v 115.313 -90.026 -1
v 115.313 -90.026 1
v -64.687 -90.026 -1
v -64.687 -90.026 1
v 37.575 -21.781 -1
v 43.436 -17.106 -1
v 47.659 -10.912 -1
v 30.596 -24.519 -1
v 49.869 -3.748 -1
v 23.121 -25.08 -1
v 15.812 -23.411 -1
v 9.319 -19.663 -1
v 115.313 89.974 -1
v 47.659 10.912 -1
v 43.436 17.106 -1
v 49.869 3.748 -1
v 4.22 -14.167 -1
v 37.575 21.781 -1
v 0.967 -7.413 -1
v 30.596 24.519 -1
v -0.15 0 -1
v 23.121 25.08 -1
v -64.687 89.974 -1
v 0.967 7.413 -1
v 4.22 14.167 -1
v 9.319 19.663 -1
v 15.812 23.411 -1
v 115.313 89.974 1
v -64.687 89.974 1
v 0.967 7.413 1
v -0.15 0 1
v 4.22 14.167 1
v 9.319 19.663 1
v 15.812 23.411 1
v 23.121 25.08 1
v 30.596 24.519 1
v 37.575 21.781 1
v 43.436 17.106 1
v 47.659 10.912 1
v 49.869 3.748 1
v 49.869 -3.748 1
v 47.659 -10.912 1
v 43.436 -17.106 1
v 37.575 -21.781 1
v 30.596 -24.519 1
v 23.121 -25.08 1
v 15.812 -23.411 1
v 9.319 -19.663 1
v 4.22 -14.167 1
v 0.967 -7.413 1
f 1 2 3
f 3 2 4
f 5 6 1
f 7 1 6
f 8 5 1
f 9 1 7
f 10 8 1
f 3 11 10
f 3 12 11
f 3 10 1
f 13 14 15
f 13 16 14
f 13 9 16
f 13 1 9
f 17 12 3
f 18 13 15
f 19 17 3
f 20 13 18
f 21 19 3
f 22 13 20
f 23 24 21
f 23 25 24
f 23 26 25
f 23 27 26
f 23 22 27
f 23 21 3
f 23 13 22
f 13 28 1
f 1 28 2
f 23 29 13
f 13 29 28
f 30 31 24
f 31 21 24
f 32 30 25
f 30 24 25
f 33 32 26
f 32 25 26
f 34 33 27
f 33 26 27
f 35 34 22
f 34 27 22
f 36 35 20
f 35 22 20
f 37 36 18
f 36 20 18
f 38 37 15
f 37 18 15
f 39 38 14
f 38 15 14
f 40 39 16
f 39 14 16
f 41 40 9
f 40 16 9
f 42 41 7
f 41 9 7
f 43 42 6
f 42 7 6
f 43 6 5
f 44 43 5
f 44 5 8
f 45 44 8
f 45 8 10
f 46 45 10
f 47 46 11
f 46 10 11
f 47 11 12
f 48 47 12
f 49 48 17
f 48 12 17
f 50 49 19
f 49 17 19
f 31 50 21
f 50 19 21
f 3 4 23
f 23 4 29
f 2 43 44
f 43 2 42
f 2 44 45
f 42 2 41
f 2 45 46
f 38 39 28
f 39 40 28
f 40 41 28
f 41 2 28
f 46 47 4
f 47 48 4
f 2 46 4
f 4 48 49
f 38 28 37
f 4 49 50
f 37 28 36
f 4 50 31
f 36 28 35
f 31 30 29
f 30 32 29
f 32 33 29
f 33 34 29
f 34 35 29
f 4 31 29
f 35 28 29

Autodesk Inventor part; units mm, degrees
ref_plane "YZ Plane" through (0, 0, 0) normal (1, 0, 0) x (0, 1, 0)
ref_plane "XZ Plane" through (0, 0, 0) normal (0, 1, 0) x (-1, 0, 0)
ref_plane "XY Plane" through (0, 0, 0) normal (0, 0, 1) x (1, 0, 0)
ref_plane "Work Plane1" through (0, 0, 0) normal (0, 0, -1) x (-1, 0, 0)
sketch "Sketch1" plane through (0, 0, 0) normal (0, 0, -1) x (-1, 0, 0)
  line L0 (-115.3126, -90.0255) -> (64.6874, -90.0255)
  line L1 (64.6874, -90.0255) -> (64.6874, 89.9745)
  line L2 (64.6874, 89.9745) -> (-115.3126, 89.9745)
  line L3 (-115.3126, 89.9745) -> (-115.3126, -90.0255)
  line L4 (-25.3126, 0) -> (-25.3126, -88.1346) construction
  line L5 (-1.4905, -0.0255) -> (99.3864, -0.0255) construction
  point P0 (0, 0)
  point P1 (-25.3126, -0.0255)
  dimension "d0" = 180
  dimension "d1" = 180
  dimension "d8" = 90
  dimension "d9" = 90
extrude "Extrusion1" add sketch "Sketch1" along normal mid plane 2
sketch "Sketch2" plane through (0, 0, -1) normal (0, 0, -1) x (-1, 0, 0)
  circle A0 centre (-25, 0) radius 25.15 projected
  point P0 (0, 0)
extrude "Extrusion2" cut sketch "Sketch2" against normal through all
ref_plane "Work Plane3" through (0, 0, -56) normal (0, 0, -1) x (-1, 0, 0)
ref_plane "Work Plane2" through (0, 0, -116) normal (0, 0, -1) x (-1, 0, 0)
equation "\"d1\" = d0"
equation "\"d8\" = 0.5 * d0"
equation "\"d9\" = d8"
properties part number "tapa_dummy"
